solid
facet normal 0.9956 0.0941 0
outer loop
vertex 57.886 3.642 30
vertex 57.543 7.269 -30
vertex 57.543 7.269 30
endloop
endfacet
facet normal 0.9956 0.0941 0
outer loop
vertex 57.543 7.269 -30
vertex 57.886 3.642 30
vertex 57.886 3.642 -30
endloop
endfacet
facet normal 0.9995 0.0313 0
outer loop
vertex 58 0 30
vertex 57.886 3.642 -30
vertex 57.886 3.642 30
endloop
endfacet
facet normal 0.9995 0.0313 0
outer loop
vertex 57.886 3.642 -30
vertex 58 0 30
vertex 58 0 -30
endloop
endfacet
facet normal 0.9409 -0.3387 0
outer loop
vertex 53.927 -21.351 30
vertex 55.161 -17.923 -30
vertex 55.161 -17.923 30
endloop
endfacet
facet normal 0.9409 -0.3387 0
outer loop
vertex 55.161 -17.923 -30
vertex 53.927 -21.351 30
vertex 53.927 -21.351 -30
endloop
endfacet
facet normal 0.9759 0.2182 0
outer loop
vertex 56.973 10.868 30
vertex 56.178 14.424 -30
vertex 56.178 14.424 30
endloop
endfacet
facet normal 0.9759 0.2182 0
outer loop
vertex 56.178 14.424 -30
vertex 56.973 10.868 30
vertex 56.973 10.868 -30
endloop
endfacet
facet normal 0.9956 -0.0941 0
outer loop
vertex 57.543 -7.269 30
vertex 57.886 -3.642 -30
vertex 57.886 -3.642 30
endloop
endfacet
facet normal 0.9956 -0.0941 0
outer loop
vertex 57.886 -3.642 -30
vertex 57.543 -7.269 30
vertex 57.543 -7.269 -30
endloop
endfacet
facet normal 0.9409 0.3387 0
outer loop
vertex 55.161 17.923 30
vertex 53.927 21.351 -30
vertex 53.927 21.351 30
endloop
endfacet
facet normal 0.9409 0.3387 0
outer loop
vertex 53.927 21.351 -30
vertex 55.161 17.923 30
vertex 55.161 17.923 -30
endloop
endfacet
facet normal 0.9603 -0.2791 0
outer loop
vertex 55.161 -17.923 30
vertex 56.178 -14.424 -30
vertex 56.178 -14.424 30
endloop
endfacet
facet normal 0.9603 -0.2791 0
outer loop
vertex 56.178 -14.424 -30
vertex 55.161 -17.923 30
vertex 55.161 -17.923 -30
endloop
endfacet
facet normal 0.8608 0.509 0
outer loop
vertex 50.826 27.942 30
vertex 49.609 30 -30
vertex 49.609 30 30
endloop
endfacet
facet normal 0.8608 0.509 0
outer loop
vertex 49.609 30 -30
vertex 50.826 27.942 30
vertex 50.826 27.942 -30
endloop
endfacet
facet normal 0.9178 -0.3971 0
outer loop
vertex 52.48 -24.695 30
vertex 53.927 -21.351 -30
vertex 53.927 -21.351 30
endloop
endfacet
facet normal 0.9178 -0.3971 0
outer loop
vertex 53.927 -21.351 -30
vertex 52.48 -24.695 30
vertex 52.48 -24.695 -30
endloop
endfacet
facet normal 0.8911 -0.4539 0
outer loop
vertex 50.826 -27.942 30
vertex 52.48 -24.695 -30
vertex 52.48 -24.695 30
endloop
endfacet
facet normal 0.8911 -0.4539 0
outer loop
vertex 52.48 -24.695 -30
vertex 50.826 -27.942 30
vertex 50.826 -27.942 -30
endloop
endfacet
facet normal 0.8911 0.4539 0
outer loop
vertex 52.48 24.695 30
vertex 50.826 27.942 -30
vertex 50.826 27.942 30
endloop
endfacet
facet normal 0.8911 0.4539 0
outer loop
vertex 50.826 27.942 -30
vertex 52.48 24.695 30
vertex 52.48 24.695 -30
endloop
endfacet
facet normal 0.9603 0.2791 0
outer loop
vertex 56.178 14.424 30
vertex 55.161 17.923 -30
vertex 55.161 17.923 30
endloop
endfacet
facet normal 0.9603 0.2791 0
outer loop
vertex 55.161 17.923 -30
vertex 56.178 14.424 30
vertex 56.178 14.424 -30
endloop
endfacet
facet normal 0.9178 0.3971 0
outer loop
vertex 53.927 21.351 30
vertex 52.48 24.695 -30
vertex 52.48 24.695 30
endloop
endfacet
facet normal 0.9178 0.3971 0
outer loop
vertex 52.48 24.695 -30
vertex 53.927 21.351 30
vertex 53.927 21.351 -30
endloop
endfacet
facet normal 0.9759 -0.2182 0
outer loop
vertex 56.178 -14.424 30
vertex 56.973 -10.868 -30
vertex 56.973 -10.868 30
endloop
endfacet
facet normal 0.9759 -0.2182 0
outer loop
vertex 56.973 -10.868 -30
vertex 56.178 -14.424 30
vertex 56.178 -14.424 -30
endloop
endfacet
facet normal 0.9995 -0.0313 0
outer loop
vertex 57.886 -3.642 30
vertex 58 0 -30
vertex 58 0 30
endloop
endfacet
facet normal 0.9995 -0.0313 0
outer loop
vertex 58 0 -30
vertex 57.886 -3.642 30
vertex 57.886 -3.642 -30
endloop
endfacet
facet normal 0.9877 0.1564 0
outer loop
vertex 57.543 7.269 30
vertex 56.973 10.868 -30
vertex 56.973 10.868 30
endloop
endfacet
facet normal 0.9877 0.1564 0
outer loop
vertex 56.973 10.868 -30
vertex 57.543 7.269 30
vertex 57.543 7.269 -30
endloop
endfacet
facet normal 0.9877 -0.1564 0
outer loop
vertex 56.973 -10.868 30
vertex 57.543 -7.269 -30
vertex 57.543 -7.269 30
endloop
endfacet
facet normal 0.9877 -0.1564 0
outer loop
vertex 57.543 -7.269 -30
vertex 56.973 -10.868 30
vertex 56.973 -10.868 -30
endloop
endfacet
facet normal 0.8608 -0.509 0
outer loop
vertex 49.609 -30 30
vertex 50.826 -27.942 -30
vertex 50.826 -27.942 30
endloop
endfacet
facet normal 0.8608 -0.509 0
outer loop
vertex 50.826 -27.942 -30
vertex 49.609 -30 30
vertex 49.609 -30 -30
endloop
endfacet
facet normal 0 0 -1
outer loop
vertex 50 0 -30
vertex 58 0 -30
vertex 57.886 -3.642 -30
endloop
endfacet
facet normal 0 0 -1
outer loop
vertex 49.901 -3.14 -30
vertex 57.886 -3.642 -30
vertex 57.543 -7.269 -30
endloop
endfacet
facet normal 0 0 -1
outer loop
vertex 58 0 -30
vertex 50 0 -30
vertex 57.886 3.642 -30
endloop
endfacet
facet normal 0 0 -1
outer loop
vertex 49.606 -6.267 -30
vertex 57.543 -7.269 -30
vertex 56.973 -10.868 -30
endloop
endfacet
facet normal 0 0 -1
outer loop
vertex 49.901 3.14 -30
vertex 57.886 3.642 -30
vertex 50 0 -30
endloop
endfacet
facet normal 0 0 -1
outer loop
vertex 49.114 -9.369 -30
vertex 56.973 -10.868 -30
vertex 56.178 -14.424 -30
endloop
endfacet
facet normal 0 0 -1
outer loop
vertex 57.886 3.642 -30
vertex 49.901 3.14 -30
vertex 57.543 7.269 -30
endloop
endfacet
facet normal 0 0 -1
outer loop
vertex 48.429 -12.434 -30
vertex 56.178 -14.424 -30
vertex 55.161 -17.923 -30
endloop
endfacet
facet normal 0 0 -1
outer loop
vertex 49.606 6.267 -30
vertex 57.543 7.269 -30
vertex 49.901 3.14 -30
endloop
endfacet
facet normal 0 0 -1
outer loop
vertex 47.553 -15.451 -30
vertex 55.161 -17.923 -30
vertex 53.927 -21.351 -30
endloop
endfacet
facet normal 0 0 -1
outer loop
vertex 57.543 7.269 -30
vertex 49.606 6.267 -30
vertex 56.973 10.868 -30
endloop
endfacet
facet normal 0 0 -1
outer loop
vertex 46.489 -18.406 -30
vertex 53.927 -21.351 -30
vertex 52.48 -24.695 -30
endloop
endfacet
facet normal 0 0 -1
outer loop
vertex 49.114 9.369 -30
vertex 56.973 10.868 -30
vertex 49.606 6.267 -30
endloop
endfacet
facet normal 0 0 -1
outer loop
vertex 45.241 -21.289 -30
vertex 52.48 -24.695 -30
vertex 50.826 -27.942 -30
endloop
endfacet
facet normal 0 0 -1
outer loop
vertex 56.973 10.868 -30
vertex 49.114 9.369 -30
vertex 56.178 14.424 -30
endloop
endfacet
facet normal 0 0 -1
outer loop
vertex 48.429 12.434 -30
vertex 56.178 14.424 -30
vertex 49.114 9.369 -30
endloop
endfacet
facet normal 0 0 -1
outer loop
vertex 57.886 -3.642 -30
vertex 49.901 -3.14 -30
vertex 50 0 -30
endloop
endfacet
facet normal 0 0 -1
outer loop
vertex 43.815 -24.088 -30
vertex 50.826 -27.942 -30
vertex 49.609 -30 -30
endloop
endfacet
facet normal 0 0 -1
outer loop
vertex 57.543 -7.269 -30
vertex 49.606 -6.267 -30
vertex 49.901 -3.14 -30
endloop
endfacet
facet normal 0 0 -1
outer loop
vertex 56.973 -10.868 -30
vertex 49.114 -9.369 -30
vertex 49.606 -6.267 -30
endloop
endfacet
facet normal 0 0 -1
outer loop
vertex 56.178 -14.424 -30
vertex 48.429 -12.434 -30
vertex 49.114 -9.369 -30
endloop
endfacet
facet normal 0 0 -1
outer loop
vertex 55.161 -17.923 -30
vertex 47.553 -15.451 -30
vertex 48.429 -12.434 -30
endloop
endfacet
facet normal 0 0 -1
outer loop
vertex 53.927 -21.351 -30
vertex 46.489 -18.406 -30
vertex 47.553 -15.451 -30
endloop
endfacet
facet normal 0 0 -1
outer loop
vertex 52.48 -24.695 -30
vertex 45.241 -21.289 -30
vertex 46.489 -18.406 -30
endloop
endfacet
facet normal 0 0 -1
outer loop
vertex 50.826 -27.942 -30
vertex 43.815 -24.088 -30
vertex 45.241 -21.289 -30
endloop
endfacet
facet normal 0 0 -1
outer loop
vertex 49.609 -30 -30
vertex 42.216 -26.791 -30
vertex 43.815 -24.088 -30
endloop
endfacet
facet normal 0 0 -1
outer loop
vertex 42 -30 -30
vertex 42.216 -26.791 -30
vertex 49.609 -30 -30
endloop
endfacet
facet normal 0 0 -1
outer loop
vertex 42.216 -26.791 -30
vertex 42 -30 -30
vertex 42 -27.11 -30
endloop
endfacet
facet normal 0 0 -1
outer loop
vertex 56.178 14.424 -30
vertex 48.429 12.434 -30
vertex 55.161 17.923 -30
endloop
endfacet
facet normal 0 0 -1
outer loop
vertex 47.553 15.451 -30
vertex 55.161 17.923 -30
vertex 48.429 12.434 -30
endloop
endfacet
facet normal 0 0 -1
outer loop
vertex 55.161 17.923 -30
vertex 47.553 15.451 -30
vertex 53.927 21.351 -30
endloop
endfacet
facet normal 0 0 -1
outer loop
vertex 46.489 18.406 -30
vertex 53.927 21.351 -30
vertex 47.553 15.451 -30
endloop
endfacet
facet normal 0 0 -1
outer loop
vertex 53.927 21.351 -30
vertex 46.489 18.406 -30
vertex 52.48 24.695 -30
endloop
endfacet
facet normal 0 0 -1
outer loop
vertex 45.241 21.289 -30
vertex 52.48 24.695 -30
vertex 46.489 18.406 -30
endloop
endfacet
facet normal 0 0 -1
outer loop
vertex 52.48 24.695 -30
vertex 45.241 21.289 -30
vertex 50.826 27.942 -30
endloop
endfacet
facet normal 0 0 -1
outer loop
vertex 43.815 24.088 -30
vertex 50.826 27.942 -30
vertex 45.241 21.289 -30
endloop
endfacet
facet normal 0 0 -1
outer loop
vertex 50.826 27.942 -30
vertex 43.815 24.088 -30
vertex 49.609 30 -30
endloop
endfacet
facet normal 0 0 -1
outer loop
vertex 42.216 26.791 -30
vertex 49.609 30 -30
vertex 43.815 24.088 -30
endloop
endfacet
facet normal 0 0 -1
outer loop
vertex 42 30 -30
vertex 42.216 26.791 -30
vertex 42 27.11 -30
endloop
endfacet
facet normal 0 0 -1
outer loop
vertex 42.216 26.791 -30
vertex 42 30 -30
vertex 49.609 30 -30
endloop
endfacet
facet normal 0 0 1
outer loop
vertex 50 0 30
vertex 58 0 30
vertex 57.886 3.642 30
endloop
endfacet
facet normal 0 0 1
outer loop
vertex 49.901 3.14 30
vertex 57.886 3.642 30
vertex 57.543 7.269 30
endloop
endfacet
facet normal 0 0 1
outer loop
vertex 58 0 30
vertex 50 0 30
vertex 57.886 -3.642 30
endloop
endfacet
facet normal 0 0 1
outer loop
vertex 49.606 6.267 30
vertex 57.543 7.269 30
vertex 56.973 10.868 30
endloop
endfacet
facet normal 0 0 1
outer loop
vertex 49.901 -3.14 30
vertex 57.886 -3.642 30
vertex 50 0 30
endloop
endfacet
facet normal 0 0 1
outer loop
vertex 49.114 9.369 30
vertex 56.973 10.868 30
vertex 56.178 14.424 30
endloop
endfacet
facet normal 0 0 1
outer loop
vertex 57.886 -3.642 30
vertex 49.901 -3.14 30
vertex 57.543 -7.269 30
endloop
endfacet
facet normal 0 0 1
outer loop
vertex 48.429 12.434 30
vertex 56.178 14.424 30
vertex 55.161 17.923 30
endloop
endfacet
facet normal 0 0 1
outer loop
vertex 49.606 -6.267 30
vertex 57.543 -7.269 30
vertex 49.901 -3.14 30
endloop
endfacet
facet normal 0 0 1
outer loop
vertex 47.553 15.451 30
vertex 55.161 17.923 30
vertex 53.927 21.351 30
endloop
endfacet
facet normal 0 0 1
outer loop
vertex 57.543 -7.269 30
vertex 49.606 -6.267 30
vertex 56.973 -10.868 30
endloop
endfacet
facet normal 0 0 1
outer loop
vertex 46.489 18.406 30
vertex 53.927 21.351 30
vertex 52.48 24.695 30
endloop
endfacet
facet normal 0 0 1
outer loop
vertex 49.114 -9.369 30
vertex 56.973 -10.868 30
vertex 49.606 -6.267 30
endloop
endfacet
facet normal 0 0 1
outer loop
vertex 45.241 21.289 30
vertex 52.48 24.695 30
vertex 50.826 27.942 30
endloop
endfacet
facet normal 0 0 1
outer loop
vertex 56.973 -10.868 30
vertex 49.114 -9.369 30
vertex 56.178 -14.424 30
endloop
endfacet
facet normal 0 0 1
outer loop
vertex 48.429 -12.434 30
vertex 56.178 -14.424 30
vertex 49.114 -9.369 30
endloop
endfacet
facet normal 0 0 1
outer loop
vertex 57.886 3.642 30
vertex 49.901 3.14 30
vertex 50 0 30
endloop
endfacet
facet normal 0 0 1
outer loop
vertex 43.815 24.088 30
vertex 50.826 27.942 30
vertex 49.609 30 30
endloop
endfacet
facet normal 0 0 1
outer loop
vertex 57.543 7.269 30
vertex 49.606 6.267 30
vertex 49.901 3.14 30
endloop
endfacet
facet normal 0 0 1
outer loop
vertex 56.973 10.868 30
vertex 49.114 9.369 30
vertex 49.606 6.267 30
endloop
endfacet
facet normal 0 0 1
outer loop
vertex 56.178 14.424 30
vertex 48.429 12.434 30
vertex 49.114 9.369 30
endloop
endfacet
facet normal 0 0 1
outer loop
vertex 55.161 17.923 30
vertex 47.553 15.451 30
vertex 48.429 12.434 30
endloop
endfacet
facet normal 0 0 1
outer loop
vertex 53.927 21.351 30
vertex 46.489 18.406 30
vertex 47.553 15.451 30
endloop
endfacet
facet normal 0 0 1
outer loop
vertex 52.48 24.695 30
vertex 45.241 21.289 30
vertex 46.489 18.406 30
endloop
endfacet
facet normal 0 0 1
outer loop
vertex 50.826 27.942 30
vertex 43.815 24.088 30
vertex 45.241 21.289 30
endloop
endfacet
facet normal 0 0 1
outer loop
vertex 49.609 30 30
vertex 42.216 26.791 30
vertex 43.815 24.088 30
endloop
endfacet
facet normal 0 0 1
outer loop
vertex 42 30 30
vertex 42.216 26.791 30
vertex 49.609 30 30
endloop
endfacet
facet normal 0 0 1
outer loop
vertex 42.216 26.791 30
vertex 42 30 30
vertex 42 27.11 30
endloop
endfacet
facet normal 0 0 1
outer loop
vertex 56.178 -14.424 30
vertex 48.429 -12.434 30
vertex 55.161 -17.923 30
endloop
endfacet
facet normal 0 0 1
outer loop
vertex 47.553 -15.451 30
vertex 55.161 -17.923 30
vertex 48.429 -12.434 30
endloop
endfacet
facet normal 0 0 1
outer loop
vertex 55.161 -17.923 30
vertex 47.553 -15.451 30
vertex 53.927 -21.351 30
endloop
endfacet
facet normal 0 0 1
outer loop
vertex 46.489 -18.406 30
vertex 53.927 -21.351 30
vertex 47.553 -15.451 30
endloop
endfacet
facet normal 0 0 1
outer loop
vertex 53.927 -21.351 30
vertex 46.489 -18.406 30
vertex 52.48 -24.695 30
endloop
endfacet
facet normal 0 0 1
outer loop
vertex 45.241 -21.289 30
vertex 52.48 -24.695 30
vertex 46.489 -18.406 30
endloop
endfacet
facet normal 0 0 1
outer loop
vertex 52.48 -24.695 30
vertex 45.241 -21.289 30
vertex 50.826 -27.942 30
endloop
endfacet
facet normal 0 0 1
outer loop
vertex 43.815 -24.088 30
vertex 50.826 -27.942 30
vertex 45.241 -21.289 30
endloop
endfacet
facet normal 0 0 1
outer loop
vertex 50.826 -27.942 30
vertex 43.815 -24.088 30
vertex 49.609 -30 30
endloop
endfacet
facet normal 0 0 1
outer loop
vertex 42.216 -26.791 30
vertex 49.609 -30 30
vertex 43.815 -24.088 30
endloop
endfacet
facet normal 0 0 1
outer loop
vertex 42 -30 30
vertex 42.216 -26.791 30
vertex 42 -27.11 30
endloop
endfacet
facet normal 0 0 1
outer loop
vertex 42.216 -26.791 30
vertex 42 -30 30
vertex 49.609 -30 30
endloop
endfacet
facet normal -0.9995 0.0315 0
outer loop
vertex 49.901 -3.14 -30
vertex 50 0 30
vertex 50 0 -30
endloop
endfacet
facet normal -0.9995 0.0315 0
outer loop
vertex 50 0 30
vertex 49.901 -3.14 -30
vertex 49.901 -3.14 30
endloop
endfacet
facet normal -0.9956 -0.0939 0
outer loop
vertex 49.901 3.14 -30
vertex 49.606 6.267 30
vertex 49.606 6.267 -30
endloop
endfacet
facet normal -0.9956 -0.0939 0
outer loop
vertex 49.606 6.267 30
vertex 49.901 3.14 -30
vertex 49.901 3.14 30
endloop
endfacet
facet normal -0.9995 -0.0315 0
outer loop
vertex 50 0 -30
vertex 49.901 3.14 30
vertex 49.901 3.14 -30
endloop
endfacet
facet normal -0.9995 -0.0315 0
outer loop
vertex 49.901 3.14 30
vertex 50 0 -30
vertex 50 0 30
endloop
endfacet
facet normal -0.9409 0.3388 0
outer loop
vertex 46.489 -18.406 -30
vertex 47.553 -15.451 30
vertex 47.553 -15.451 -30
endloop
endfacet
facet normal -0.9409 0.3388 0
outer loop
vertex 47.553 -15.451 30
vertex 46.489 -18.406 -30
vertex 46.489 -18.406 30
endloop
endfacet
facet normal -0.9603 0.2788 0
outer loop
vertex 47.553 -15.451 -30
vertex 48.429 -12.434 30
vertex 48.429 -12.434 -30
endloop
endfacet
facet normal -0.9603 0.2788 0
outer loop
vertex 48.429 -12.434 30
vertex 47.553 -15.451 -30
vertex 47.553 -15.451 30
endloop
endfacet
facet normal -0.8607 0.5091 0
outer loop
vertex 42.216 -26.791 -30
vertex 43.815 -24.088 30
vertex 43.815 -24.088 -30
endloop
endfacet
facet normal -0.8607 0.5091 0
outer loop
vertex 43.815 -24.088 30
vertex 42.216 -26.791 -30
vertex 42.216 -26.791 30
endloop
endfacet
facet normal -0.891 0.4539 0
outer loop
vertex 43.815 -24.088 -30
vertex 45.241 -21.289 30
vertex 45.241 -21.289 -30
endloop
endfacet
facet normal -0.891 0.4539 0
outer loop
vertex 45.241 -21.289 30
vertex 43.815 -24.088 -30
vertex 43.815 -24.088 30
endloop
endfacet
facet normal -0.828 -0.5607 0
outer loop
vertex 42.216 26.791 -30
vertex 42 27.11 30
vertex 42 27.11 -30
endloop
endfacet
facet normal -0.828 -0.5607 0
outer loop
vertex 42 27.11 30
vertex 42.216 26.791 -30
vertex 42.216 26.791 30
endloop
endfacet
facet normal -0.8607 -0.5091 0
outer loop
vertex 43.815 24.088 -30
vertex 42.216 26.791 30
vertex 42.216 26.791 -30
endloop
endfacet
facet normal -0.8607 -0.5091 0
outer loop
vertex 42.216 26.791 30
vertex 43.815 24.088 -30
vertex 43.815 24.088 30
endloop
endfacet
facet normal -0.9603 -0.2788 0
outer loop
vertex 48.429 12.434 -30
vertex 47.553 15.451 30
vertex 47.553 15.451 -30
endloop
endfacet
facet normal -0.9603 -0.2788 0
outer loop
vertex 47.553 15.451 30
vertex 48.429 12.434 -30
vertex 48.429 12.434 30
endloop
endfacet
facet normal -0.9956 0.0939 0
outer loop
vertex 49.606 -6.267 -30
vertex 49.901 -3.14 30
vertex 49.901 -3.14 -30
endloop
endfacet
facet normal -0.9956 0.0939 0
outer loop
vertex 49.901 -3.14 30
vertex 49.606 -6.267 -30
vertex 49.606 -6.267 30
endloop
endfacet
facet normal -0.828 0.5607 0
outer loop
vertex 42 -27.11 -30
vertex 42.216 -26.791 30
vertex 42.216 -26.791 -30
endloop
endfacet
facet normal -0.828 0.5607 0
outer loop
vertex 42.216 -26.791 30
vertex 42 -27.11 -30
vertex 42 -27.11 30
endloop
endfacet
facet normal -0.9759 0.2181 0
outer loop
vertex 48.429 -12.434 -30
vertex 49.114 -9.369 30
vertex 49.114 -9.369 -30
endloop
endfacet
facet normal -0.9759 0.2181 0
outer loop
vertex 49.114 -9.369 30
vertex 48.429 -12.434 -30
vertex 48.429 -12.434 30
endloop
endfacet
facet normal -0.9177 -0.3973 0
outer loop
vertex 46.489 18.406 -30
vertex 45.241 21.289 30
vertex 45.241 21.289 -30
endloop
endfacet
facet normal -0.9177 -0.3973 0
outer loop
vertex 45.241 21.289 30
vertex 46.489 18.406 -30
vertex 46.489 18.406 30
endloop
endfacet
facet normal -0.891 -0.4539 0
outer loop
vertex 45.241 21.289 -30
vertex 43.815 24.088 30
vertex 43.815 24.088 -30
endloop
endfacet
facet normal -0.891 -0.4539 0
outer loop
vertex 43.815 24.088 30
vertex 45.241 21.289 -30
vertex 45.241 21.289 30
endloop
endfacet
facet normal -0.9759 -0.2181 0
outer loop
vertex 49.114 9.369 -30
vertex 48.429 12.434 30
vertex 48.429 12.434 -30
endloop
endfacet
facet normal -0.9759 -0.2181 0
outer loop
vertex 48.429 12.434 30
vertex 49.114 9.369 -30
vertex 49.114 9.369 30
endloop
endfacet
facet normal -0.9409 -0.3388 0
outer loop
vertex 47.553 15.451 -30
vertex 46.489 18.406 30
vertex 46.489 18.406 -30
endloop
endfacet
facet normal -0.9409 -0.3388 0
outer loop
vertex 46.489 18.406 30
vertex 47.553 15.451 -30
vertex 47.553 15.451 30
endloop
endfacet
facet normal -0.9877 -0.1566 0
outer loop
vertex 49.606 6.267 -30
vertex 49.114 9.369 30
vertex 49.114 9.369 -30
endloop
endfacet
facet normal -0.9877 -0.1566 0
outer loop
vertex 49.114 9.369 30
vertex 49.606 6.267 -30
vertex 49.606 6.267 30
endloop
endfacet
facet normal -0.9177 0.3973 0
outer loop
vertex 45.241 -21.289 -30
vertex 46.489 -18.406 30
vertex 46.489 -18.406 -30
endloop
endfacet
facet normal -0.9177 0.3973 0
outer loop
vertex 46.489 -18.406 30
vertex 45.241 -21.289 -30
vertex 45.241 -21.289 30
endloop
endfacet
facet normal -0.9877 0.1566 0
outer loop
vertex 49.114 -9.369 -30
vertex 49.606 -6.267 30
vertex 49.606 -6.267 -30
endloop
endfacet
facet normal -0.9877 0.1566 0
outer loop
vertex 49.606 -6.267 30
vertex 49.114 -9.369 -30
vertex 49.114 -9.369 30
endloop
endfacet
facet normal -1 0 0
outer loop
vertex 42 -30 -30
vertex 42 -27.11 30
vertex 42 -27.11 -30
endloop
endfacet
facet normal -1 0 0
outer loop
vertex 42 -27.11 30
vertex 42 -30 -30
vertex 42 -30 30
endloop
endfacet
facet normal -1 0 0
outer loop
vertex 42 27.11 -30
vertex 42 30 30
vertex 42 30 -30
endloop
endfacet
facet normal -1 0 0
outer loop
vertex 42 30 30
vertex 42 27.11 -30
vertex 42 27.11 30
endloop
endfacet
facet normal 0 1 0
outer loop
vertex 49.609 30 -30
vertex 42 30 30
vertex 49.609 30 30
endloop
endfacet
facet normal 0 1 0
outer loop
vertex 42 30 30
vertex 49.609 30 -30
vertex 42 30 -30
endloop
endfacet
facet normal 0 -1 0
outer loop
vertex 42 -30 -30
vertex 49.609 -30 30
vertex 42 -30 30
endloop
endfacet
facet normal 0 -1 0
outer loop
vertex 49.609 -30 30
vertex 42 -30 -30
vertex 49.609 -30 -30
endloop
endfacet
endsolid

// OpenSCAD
//参数根据实际情况调整
R_in = 50;          // 圆柱筒的外径 
Thickness = 8;      // 支架的总厚度
Height = 60;        // 支架的高度 (沿圆柱轴向)
Width = 60;

$fn = 100;          // 让圆弧变平滑 (采样率)

// 1. 创建一个圆环 
module ring_base() {
    //这个是定义一个模块，ring_base是它的名字
    difference() {
    // 语法是第一个形状减去；第二个形状；第三个形状……
        cylinder(h = Height, r = R_in + Thickness, center = true);
    // 减去内圆柱，形成空心管
        cylinder(h = Height + 1, r = R_in, center = true);
    }
}

module tile_base(){
    intersection() {
    //语法是取A；B交集
        ring_base();
        translate([R_in, 0, 0]) 
    //translate是移动位置向量
            cube([Thickness * 2, Width, Height + 1], center = true);
    }
}
tile_base();


//!my_tile(); // 预览窗口将只显示这个模块，忽略代码中其他所有东西
